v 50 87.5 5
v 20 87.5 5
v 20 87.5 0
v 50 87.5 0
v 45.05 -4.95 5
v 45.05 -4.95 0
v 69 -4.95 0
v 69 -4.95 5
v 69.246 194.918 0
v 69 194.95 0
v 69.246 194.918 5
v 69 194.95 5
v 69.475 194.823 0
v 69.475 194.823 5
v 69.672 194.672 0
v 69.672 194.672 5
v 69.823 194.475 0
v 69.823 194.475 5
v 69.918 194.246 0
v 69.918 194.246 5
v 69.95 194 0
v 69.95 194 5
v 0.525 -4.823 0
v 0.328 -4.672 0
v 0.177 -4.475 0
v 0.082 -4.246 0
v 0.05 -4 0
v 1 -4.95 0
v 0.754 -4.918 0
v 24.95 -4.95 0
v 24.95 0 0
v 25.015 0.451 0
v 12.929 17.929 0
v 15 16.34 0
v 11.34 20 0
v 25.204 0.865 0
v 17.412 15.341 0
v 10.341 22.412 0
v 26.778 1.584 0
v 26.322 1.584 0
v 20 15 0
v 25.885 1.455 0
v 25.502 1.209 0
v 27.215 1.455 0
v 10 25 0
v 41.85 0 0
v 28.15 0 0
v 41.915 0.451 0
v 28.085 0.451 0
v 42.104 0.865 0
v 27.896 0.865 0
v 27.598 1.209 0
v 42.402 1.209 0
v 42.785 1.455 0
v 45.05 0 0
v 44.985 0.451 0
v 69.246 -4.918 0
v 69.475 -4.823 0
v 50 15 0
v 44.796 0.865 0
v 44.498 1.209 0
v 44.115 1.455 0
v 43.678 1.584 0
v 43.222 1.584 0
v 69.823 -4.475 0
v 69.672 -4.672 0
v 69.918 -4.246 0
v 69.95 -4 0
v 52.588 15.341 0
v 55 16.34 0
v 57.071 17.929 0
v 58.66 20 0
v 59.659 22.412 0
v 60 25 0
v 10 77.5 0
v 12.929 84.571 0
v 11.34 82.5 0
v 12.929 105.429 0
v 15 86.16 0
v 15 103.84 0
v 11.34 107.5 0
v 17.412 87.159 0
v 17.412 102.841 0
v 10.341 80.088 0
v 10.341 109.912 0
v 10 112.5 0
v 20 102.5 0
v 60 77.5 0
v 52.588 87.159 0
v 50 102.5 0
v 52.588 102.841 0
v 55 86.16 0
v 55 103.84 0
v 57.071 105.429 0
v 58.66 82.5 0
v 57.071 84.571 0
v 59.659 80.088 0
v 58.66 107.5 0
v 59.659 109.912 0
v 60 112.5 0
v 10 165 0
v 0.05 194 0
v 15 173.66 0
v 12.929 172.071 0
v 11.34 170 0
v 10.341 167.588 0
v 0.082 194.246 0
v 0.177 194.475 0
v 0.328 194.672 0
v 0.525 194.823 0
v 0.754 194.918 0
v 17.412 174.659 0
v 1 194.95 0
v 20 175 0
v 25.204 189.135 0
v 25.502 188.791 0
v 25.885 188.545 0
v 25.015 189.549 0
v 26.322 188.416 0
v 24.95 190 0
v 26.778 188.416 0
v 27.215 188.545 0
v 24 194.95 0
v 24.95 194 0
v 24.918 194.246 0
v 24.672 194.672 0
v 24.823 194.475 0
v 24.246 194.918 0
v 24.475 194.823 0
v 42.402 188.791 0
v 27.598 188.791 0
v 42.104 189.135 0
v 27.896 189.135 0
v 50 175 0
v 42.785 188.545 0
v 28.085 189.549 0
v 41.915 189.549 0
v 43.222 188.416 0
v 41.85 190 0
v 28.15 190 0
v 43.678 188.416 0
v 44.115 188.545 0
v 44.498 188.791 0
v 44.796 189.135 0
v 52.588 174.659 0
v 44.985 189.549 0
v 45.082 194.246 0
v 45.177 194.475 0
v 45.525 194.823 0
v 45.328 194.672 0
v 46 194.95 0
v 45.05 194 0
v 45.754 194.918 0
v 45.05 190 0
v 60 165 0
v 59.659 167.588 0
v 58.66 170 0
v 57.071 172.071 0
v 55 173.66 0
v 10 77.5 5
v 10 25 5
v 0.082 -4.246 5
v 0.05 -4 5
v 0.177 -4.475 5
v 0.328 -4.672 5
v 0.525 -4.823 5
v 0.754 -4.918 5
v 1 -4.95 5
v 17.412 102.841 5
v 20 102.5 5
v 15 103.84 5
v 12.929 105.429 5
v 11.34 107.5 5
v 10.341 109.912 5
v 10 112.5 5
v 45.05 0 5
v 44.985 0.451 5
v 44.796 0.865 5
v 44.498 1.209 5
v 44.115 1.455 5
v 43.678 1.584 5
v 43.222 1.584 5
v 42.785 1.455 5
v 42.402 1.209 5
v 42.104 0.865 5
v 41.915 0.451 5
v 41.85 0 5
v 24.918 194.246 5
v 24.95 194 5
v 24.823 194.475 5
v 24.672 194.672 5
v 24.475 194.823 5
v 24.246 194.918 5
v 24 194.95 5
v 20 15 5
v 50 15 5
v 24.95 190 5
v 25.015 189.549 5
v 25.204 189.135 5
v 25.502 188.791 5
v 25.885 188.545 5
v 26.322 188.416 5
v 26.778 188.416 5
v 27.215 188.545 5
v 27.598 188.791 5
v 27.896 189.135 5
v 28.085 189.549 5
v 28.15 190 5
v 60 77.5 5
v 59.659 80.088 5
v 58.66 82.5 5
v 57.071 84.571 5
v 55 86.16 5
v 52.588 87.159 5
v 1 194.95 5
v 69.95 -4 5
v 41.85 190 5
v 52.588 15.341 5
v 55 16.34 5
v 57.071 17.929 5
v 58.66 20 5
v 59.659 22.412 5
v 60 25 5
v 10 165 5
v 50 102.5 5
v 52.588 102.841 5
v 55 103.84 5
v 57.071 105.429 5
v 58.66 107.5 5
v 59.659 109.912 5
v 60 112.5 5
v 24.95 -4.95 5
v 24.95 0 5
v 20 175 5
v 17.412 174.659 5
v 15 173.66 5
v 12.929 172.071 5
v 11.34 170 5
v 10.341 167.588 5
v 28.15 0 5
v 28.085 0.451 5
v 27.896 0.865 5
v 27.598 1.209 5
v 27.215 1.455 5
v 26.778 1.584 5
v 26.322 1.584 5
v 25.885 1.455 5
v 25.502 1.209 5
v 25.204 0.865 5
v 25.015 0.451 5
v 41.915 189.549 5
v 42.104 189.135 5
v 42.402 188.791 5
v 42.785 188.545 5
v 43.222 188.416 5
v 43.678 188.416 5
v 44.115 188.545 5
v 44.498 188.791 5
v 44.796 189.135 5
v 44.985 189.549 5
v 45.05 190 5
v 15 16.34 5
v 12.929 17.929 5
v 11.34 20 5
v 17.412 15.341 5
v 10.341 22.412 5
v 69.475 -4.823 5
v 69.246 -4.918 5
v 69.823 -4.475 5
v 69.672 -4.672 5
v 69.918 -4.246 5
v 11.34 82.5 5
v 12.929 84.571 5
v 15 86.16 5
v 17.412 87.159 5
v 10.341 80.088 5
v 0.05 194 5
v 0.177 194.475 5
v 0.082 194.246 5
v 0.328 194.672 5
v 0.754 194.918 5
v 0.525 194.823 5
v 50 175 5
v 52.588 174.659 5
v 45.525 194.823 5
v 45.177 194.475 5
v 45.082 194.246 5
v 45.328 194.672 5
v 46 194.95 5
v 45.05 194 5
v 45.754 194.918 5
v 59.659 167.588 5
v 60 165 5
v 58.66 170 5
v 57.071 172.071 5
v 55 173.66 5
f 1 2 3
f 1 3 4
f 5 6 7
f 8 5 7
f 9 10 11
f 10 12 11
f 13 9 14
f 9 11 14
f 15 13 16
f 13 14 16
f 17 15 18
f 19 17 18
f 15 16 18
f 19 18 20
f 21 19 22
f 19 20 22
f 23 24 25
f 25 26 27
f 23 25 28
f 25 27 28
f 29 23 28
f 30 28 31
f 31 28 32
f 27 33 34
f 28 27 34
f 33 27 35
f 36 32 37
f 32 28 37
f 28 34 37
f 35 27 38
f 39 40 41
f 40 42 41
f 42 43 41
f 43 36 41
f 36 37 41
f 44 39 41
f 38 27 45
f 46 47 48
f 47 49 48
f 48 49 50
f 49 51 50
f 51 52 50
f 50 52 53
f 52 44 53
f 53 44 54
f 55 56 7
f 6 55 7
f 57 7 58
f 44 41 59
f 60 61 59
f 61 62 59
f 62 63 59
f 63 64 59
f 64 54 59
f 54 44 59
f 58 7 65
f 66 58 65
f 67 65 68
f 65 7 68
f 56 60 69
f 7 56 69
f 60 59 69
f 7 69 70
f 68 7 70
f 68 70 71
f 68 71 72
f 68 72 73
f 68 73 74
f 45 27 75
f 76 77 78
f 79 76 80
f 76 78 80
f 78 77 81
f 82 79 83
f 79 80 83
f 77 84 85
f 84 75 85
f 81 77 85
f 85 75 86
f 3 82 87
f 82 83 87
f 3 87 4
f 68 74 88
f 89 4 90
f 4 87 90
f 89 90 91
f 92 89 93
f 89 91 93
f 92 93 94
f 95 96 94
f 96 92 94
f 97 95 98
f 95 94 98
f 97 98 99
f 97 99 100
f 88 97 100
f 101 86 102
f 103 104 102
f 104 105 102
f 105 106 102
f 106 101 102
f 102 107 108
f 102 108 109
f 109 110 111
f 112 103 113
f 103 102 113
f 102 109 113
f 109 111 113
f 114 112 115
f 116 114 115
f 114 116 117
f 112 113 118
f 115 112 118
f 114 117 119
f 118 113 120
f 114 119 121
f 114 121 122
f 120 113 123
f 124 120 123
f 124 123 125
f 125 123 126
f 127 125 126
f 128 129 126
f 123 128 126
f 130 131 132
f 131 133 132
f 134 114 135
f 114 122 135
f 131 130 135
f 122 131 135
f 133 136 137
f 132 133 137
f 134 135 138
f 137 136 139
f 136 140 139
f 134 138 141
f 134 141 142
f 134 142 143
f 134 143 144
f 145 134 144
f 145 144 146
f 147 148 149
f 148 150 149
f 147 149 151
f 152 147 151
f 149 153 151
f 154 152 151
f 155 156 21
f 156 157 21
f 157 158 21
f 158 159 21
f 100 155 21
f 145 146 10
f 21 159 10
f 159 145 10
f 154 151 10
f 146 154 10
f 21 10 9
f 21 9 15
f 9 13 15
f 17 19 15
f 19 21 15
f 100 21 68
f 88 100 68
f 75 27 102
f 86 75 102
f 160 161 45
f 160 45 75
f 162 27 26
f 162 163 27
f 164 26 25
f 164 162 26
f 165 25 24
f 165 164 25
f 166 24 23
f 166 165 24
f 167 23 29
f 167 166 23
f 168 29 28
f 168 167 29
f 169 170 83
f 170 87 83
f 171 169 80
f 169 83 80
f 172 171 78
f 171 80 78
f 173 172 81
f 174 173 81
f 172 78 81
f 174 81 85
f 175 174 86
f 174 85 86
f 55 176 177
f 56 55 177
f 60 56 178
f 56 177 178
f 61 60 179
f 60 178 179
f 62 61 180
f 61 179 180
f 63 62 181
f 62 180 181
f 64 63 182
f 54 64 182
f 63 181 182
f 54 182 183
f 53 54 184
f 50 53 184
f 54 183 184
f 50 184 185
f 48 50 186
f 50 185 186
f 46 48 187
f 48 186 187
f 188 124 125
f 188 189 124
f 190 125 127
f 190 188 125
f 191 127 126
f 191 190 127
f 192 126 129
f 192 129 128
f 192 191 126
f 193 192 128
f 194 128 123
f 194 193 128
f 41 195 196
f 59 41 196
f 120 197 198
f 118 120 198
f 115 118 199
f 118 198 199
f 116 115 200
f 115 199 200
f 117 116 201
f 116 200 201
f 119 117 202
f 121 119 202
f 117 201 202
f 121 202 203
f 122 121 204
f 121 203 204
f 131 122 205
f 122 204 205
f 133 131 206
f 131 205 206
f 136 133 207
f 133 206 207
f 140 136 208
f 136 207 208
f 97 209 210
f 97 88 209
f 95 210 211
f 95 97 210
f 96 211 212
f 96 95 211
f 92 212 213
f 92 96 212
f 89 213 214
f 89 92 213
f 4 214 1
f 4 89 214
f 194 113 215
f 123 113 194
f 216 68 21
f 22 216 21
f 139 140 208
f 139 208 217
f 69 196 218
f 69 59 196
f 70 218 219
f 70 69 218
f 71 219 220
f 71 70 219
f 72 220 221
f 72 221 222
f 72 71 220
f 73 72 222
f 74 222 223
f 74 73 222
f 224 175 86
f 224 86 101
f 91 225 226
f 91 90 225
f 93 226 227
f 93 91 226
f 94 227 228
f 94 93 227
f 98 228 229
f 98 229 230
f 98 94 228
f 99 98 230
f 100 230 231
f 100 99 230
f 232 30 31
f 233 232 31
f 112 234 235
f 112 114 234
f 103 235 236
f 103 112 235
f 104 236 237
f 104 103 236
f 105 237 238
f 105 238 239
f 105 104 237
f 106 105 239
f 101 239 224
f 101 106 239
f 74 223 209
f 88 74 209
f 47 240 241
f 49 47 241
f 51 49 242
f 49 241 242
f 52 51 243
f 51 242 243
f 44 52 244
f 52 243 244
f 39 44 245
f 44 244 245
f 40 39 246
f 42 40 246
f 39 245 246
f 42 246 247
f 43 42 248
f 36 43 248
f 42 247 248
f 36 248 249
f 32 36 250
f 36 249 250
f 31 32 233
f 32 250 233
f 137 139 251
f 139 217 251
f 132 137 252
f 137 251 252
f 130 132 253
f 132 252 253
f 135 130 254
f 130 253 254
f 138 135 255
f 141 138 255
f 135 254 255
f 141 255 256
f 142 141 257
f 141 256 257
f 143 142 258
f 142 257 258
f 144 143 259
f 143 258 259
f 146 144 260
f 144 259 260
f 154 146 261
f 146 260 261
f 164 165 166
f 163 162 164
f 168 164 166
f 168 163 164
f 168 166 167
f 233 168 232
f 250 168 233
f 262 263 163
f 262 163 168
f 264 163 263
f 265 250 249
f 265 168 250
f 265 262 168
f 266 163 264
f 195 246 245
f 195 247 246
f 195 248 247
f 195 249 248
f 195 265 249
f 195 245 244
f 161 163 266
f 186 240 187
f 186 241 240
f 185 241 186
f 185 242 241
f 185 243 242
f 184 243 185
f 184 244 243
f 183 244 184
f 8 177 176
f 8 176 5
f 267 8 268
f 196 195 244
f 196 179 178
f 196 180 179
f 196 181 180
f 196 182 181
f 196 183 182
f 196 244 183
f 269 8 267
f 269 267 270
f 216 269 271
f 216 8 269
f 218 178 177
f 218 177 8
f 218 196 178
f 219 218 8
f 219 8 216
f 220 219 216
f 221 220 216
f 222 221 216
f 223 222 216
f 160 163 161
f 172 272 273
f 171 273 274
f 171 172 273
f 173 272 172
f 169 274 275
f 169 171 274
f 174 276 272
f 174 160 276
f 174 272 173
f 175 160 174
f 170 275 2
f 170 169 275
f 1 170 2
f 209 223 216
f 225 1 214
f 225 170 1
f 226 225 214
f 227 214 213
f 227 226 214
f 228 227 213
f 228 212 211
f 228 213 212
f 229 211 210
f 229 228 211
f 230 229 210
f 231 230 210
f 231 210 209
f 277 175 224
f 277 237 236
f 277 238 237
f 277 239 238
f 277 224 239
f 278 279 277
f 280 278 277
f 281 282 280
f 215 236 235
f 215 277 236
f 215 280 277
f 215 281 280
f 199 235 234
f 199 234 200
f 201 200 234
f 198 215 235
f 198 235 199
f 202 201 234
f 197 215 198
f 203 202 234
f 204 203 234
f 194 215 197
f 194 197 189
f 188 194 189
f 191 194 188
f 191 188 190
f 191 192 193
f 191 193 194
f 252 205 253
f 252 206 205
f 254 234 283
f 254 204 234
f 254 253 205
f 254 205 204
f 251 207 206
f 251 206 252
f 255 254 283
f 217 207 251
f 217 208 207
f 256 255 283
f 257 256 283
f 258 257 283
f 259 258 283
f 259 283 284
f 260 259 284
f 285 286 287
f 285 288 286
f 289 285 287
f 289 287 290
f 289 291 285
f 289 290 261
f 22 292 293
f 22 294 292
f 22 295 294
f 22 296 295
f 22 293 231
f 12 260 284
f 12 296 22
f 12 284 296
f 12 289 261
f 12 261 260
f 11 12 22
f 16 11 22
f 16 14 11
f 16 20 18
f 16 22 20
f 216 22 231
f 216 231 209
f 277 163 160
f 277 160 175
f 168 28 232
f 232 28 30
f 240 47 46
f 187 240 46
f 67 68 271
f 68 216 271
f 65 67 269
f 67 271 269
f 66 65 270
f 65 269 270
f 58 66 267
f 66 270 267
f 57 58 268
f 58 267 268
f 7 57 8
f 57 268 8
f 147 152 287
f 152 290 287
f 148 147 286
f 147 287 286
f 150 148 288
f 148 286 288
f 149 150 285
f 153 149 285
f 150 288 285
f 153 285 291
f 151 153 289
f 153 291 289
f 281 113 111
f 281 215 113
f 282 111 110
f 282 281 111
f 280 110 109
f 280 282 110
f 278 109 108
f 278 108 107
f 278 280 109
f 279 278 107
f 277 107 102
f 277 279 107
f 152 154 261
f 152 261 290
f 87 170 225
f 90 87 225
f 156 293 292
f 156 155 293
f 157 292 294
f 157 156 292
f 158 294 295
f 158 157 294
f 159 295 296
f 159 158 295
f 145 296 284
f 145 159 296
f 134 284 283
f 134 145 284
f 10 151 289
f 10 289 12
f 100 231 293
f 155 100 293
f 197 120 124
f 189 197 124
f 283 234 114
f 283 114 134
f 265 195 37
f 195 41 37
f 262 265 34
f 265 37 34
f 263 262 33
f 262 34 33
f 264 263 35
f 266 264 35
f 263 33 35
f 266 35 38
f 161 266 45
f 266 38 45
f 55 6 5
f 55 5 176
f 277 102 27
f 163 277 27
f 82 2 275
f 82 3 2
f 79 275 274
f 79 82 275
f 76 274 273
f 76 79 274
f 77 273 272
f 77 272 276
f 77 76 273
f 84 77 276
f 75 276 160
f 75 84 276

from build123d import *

# Parameters (mm, degrees)
SKETCH_1_W          = 25
SKETCH_1_H          = 5
SKETCH_1_W_2        = 70
SKETCH_1_H_2        = 190
EXTRUDE_1_DEPTH     = 5
SKETCH_2_R          = 1.55
CUT_EXTRUDE_1_DEPTH = 5
SKETCH_3_W          = 50
SKETCH_3_H          = 72.5
CUT_EXTRUDE_2_DEPTH = 5
FILLET_1_R          = 10
FILLET_2_R          = 1
MOVE_FACE_1_BY      = 0.05
MOVE_FACE_1_2_BY    = 0.05
MOVE_FACE_1_3_BY    = 0.05
MOVE_FACE_1_4_BY    = 0.05
MOVE_FACE_1_5_BY    = 0.05
MOVE_FACE_1_6_BY    = 0.05
MOVE_FACE_1_7_BY    = 0.05
MOVE_FACE_1_8_BY    = 0.05
MOVE_FACE_1_9_BY    = 0.05
MOVE_FACE_1_10_BY   = 0.05
MOVE_FACE_1_11_BY   = 0.05
MOVE_FACE_1_12_BY   = 0.05
MOVE_FACE_1_13_BY   = 0.05
MOVE_FACE_1_14_BY   = 0.05
MOVE_FACE_1_15_BY   = 0.05
MOVE_FACE_1_16_BY   = 0.05
MOVE_FACE_1_17_BY   = 0.05
MOVE_FACE_1_18_BY   = 0.05
MOVE_FACE_1_19_BY   = 0.05
MOVE_FACE_1_20_BY   = 0.05


with BuildPart() as part:
    # 草图1 → 凸台-拉伸1 (new body)
    with BuildSketch(Plane.XY):
        with Locations((57.5, 192.5)):
            Rectangle(SKETCH_1_W, SKETCH_1_H)
        with Locations((35, 95)):
            Rectangle(SKETCH_1_W_2, SKETCH_1_H_2)
        with Locations((12.5, 192.5)):
            Rectangle(SKETCH_1_W, SKETCH_1_H)
        with Locations((57.5, -2.5)):
            Rectangle(SKETCH_1_W, SKETCH_1_H)
        with Locations((12.5, -2.5)):
            Rectangle(SKETCH_1_W, SKETCH_1_H)
    extrude(amount=EXTRUDE_1_DEPTH)

    # 草图2 → 切除-拉伸1 (cut)
    with BuildSketch(Plane.XY.offset(5)):
        with Locations((43.45, 0)):
            Circle(SKETCH_2_R)
        with Locations((26.55, 0)):
            Circle(SKETCH_2_R)
        with Locations((43.45, 190)):
            Circle(SKETCH_2_R)
        with Locations((26.55, 190)):
            Circle(SKETCH_2_R)
    extrude(amount=-CUT_EXTRUDE_1_DEPTH, mode=Mode.SUBTRACT)

    # 草图3 → 切除-拉伸2 (cut)
    with BuildSketch(Plane.XY.offset(5)):
        with Locations((35, 51.25)):
            Rectangle(SKETCH_3_W, SKETCH_3_H)
        with Locations((35, 138.75)):
            Rectangle(SKETCH_3_W, SKETCH_3_H)
    extrude(amount=-CUT_EXTRUDE_2_DEPTH, mode=Mode.SUBTRACT)

    # 圆角1
    fillet_1_edges = [part.edges().sort_by_distance(p)[0] for p in [
        (10, 175, 2.5),
        (60, 175, 2.5),
        (60, 102.5, 2.5),
        (10, 15, 2.5),
        (10, 87.5, 2.5),
        (60, 87.5, 2.5),
        (60, 15, 2.5),
        (10, 102.5, 2.5),
    ]]
    fillet(fillet_1_edges, radius=FILLET_1_R)

    # 圆角2
    fillet_2_edges = [part.edges().sort_by_distance(p)[0] for p in [
        (45, 195, 2.5),
        (70, 195, 2.5),
        (70, -5, 2.5),
        (0, -5, 2.5),
        (0, 195, 2.5),
        (25, 195, 2.5),
    ]]
    fillet(fillet_2_edges, radius=FILLET_2_R)

    # Move Face 1: a curved face moved inward by 0.05
    add(Solid.thicken(part.faces().sort_by_distance((69.707106781, -4.707106781, 2.5))[0], -MOVE_FACE_1_BY), mode=Mode.SUBTRACT)

    # Move Face 1 2: a face moved inward by 0.05
    extrude(part.faces().sort_by_distance((57, -5, 2.5))[0], amount=MOVE_FACE_1_2_BY, dir=(0, 1, 0), mode=Mode.SUBTRACT)

    # Move Face 1 3: a face moved inward by 0.05
    extrude(part.faces().sort_by_distance((45, -2.5, 2.5))[0], amount=MOVE_FACE_1_3_BY, dir=(1, 0, 0), mode=Mode.SUBTRACT)

    # Move Face 1 4: a curved face moved inward by 0.05
    add(Solid.thicken(part.faces().sort_by_distance((43.45, 1.55, 2.5))[0], -MOVE_FACE_1_4_BY), mode=Mode.SUBTRACT)

    # Move Face 1 5: a face moved inward by 0.05
    extrude(part.faces().sort_by_distance((25, -2.5, 2.5))[0], amount=MOVE_FACE_1_5_BY, dir=(-1, 0, 0), mode=Mode.SUBTRACT)

    # Move Face 1 6: a curved face moved inward by 0.05
    add(Solid.thicken(part.faces().sort_by_distance((26.55, 1.55, 2.5))[0], -MOVE_FACE_1_6_BY), mode=Mode.SUBTRACT)

    # Move Face 1 7: a face moved inward by 0.05
    extrude(part.faces().sort_by_distance((13, -5, 2.5))[0], amount=MOVE_FACE_1_7_BY, dir=(0, 1, 0), mode=Mode.SUBTRACT)

    # Move Face 1 8: a curved face moved inward by 0.05
    add(Solid.thicken(part.faces().sort_by_distance((0.292893219, -4.707106781, 2.5))[0], -MOVE_FACE_1_8_BY), mode=Mode.SUBTRACT)

    # Move Face 1 9: a face moved inward by 0.05
    extrude(part.faces().sort_by_distance((0, 95, 2.5))[0], amount=MOVE_FACE_1_9_BY, dir=(1, 0, 0), mode=Mode.SUBTRACT)

    # Move Face 1 10: a curved face moved inward by 0.05
    add(Solid.thicken(part.faces().sort_by_distance((0.292893219, 194.707106781, 2.5))[0], -MOVE_FACE_1_10_BY), mode=Mode.SUBTRACT)

    # Move Face 1 11: a face moved inward by 0.05
    extrude(part.faces().sort_by_distance((12.5, 195, 2.5))[0], amount=MOVE_FACE_1_11_BY, dir=(0, -1, 0), mode=Mode.SUBTRACT)

    # Move Face 1 12: a curved face moved inward by 0.05
    add(Solid.thicken(part.faces().sort_by_distance((24.707106781, 194.707106781, 2.5))[0], -MOVE_FACE_1_12_BY), mode=Mode.SUBTRACT)

    # Move Face 1 13: a face moved inward by 0.05
    extrude(part.faces().sort_by_distance((25, 192, 2.5))[0], amount=MOVE_FACE_1_13_BY, dir=(-1, 0, 0), mode=Mode.SUBTRACT)

    # Move Face 1 14: a curved face moved inward by 0.05
    add(Solid.thicken(part.faces().sort_by_distance((26.55, 188.45, 2.5))[0], -MOVE_FACE_1_14_BY), mode=Mode.SUBTRACT)

    # Move Face 1 15: a curved face moved inward by 0.05
    add(Solid.thicken(part.faces().sort_by_distance((43.45, 188.45, 2.5))[0], -MOVE_FACE_1_15_BY), mode=Mode.SUBTRACT)

    # Move Face 1 16: a face moved inward by 0.05
    extrude(part.faces().sort_by_distance((45, 192, 2.5))[0], amount=MOVE_FACE_1_16_BY, dir=(1, 0, 0), mode=Mode.SUBTRACT)

    # Move Face 1 17: a curved face moved inward by 0.05
    add(Solid.thicken(part.faces().sort_by_distance((45.292893219, 194.707106781, 2.5))[0], -MOVE_FACE_1_17_BY), mode=Mode.SUBTRACT)

    # Move Face 1 18: a face moved inward by 0.05
    extrude(part.faces().sort_by_distance((57.5, 195, 2.5))[0], amount=MOVE_FACE_1_18_BY, dir=(0, -1, 0), mode=Mode.SUBTRACT)

    # Move Face 1 19: a curved face moved inward by 0.05
    add(Solid.thicken(part.faces().sort_by_distance((69.707106781, 194.707106781, 2.5))[0], -MOVE_FACE_1_19_BY), mode=Mode.SUBTRACT)

    # Move Face 1 20: a face moved inward by 0.05
    extrude(part.faces().sort_by_distance((70, 95, 2.5))[0], amount=MOVE_FACE_1_20_BY, dir=(-1, 0, 0), mode=Mode.SUBTRACT)


solid = part.part
